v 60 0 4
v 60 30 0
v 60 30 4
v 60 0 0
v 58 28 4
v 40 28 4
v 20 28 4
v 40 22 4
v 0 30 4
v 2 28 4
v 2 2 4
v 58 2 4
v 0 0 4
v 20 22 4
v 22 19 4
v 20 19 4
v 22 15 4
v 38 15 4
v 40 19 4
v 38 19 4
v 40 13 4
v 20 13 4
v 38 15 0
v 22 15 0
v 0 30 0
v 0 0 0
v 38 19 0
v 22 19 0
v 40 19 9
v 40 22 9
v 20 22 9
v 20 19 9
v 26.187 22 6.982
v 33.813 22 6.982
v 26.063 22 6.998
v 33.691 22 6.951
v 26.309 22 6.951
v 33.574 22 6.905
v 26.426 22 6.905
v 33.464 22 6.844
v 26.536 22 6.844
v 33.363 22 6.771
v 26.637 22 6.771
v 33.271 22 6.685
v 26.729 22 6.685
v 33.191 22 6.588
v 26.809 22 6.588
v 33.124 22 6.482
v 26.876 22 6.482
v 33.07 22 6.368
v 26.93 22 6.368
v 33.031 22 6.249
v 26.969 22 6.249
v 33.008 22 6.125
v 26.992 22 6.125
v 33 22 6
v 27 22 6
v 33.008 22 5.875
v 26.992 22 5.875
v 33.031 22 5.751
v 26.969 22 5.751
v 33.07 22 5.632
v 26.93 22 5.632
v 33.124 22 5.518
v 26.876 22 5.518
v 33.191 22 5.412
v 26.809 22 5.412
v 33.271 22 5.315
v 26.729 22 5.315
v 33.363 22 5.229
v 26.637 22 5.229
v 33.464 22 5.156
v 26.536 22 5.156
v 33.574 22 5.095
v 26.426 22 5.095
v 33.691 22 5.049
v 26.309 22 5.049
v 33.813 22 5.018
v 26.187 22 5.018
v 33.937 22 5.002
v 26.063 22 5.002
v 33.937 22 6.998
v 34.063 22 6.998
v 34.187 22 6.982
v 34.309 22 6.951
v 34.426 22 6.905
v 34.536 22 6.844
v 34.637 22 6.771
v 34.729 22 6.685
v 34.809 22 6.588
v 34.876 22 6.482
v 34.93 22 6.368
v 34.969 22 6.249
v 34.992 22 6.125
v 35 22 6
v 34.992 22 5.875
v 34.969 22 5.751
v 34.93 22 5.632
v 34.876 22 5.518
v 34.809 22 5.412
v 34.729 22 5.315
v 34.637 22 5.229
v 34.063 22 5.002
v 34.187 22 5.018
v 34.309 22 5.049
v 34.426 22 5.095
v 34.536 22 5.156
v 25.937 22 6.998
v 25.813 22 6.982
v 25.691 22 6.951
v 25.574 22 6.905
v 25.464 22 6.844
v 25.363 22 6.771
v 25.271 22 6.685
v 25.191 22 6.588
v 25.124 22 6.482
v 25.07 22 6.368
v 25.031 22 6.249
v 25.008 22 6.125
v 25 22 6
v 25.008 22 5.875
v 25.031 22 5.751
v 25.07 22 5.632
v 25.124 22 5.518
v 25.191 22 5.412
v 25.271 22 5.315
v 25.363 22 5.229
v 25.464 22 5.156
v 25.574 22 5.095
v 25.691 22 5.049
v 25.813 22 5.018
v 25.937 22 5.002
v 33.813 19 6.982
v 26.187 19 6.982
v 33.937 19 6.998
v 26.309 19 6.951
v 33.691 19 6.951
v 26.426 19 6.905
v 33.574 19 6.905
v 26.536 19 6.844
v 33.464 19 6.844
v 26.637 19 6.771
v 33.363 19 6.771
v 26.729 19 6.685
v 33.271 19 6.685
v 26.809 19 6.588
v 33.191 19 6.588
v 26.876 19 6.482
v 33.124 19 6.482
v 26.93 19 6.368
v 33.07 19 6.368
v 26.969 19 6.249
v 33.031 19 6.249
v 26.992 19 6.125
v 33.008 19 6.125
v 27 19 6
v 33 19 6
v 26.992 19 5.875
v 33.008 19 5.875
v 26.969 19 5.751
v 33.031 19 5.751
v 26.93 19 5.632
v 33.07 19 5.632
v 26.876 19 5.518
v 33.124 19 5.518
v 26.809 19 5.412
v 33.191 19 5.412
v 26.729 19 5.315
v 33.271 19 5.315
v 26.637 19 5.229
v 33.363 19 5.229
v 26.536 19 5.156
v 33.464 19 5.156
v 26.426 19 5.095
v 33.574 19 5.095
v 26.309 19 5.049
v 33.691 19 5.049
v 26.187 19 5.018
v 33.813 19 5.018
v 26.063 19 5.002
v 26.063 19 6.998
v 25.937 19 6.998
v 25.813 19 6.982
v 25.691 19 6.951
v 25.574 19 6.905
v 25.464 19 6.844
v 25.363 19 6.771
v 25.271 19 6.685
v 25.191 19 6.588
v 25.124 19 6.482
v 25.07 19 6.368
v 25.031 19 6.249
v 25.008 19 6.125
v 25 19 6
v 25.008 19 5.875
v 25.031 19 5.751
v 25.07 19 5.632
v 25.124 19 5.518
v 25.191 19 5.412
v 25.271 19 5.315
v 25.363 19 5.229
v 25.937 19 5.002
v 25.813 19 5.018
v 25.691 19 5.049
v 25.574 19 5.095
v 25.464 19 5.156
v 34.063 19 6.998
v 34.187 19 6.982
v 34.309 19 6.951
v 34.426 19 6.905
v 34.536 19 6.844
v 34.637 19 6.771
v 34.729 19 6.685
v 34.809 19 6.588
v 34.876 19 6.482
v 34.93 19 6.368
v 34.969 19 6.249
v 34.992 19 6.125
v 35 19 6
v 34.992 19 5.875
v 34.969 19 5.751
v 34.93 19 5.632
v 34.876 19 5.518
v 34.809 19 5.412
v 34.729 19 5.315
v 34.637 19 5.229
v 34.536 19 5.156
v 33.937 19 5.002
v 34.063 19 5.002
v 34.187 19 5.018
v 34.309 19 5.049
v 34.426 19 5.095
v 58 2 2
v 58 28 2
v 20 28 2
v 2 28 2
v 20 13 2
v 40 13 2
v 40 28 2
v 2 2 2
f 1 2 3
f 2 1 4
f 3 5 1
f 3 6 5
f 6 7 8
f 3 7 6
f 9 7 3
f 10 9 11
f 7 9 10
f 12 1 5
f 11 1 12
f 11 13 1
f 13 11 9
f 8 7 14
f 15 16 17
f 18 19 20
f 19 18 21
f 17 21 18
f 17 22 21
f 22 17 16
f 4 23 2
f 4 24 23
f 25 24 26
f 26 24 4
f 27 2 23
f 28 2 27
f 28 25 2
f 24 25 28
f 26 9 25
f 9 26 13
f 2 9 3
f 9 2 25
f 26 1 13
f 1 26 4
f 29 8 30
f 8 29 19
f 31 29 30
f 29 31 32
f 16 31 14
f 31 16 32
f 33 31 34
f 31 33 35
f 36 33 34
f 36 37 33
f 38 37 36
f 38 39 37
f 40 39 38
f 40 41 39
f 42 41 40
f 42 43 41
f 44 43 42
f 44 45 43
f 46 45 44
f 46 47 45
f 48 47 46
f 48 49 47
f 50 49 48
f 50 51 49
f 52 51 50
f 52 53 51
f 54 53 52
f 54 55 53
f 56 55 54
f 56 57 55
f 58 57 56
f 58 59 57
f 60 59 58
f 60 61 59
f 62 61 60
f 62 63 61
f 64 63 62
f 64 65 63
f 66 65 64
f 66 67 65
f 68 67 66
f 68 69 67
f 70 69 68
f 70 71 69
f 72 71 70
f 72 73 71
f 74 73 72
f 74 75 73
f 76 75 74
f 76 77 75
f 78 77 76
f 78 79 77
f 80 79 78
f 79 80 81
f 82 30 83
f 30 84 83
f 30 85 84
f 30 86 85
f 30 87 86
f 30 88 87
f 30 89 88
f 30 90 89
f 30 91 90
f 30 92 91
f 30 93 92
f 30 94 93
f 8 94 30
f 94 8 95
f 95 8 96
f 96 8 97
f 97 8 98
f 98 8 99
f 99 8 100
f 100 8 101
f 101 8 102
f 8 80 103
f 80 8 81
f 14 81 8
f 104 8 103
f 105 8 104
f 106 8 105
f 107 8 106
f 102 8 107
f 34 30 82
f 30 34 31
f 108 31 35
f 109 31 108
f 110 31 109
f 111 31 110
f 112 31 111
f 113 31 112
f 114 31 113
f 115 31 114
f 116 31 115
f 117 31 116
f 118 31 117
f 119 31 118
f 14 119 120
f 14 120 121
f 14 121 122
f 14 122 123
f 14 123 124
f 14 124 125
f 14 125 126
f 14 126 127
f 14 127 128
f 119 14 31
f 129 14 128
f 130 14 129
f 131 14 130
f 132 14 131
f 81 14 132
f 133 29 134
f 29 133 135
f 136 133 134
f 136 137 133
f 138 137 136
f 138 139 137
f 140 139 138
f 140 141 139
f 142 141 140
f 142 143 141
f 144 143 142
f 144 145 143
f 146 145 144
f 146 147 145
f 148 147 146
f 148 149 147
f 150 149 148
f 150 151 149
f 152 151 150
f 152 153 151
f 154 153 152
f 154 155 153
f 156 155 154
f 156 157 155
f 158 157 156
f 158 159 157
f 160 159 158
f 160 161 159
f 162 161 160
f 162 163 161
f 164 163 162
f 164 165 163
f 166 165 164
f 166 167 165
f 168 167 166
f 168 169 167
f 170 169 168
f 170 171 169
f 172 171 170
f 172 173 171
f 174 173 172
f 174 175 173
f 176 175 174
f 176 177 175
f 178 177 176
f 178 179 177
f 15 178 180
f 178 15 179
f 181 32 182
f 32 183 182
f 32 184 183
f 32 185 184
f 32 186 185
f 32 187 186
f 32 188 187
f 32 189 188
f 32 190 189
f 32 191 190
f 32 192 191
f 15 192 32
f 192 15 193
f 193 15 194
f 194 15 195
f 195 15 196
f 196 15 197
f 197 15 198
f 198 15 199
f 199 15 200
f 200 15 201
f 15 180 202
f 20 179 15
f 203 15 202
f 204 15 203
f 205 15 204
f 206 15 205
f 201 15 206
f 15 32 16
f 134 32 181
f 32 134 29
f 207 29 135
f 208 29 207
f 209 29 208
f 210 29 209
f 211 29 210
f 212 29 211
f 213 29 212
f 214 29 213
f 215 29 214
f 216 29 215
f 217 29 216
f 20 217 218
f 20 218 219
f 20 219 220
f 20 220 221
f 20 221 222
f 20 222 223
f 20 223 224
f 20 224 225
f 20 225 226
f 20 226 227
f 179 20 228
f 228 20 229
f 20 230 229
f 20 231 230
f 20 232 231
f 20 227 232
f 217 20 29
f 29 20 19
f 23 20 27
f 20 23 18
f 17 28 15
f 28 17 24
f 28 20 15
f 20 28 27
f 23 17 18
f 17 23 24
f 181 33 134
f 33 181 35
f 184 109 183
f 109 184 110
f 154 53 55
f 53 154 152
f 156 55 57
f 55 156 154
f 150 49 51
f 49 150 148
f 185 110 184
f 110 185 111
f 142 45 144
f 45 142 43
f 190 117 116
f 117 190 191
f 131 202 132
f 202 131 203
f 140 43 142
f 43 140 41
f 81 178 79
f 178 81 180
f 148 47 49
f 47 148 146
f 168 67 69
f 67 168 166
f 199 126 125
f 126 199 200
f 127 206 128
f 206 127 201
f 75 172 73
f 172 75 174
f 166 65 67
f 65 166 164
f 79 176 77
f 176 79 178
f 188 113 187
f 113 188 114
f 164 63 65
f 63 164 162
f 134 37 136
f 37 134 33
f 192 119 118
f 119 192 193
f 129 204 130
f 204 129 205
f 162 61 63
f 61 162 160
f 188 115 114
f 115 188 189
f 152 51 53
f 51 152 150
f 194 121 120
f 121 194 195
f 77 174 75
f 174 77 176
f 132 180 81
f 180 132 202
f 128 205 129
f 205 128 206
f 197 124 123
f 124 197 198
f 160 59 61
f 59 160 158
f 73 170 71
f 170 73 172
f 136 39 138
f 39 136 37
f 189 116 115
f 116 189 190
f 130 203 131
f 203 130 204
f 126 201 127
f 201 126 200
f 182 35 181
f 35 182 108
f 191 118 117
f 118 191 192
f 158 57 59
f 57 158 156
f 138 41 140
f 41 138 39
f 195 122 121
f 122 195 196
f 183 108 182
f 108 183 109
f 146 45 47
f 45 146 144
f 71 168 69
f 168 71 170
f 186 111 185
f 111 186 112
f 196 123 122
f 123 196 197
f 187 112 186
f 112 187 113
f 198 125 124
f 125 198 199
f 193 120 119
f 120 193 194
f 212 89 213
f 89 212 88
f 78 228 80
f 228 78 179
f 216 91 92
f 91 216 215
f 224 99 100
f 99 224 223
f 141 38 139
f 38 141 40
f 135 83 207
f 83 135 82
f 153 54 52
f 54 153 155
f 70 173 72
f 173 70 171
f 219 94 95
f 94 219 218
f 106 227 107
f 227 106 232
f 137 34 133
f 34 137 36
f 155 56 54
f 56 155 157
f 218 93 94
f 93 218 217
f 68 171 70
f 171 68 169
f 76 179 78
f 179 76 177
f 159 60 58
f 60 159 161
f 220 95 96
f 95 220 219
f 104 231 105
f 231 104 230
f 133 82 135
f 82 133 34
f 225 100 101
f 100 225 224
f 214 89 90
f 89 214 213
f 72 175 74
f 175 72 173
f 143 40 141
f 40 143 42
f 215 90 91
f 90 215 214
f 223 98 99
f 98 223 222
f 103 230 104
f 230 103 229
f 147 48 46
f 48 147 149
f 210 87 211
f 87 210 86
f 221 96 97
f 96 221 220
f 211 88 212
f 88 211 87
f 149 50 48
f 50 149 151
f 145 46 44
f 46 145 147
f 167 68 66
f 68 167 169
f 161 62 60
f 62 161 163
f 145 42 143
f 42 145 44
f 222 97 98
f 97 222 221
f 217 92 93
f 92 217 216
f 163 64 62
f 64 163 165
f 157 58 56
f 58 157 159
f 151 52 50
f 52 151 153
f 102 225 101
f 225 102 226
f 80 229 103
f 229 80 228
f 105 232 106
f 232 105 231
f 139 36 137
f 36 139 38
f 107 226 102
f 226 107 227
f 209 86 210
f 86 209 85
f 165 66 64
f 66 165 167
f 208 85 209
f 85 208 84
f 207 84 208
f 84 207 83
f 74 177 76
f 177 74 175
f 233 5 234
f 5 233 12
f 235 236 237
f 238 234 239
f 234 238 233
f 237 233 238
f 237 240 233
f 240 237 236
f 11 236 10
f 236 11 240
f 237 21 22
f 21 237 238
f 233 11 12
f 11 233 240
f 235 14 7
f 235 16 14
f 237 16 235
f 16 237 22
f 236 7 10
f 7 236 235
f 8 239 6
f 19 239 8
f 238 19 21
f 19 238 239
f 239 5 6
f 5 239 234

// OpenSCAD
// file: serrated45_plane.scad
// serration using cubes




module serrated45_plane (pitch, length, width) {
    union () {
        for(i = [0:(length - 1)]) {
            translate([i * cos(45), 0, 0])
            rotate([0,0,45])
            cube( [pitch, pitch, width], center = true);
        }
    }
    {
        plane_length = pitch * cos(45) * 2 * length;
        translate([plane_length/2, - pitch/2 * 0.95, 0])
        cube([plane_length, pitch/2, width], center = true);
    }
}


// serrated45_plane (0.5, 80, 18);
// main file
include <serrated45_plane.scad>;

// GPU brace - bottom
// M6 screws
// 
// printing
// - 0.1 precision, gradual infill - does not work
//   0.06 precision, 80% infile - 

base_mount_cl = 32;
base_mount_screw_dia = 6;

base_width = 30;
base_length = 60;
base_thickness = 4;


male_x = 16;
male_y = 4;
male_z = 34 + base_thickness;    // add 4mm to go through the base

flange_x = 2;
flange_y = 8;
flange_z = male_z;

// mounting serration to base
mounting_screw_dia = 2;
mounting_screw_length = 10;
mounting_washer_dia = 5;
mounting_screw_head_dia = 4;

// mate serration surfaces
// - not applicable here

// flat base

// mounting base to the deck
// M6 mounting
// - not applicable here
// mating_screw_dia = 6;

$fn = 50;



difference () {
    {
    union () {
        // flat base
        cube([base_length, base_width, base_thickness], center = false);
        
        // mount block
        translate([base_length/2 - (male_x/2 + flange_x), base_width/2 + flange_y/2, base_thickness])
        cube([male_x + 2 * flange_x, 3, 5], center = false);
        

        }
    }
    {
        
    // hole in base plate
    translate([base_length/2 - (male_x/2), base_width/2, 0])
    cube([male_x, male_y, base_thickness], center = false);
        

        
    // mount serrated to base
    translate([base_length/2 - male_x/4, base_width/2 + flange_y, base_thickness + 2])
    rotate([90,0,0])
    #cylinder(r = mounting_screw_dia/2, h = 8, center = true);
        
    translate([base_length/2 + male_x/4, base_width/2 + flange_y, base_thickness + 2])
    rotate([90,0,0])
    #cylinder(r = mounting_screw_dia/2, h = 8, center = true);
    
    // recess in the base
    translate([2,2,2])
    cube([base_length - 4, base_width/2 - 4, 2], center = false);
        
    translate([2,2,2])
    cube([base_length/2 - 4 - male_x/2, base_width - 4, 2], center = false);
    
    translate([10 + base_length/2,2,2])
    cube([base_length/2 - 4 - male_x/2, base_width - 4, 2], center = false);
    }
}
